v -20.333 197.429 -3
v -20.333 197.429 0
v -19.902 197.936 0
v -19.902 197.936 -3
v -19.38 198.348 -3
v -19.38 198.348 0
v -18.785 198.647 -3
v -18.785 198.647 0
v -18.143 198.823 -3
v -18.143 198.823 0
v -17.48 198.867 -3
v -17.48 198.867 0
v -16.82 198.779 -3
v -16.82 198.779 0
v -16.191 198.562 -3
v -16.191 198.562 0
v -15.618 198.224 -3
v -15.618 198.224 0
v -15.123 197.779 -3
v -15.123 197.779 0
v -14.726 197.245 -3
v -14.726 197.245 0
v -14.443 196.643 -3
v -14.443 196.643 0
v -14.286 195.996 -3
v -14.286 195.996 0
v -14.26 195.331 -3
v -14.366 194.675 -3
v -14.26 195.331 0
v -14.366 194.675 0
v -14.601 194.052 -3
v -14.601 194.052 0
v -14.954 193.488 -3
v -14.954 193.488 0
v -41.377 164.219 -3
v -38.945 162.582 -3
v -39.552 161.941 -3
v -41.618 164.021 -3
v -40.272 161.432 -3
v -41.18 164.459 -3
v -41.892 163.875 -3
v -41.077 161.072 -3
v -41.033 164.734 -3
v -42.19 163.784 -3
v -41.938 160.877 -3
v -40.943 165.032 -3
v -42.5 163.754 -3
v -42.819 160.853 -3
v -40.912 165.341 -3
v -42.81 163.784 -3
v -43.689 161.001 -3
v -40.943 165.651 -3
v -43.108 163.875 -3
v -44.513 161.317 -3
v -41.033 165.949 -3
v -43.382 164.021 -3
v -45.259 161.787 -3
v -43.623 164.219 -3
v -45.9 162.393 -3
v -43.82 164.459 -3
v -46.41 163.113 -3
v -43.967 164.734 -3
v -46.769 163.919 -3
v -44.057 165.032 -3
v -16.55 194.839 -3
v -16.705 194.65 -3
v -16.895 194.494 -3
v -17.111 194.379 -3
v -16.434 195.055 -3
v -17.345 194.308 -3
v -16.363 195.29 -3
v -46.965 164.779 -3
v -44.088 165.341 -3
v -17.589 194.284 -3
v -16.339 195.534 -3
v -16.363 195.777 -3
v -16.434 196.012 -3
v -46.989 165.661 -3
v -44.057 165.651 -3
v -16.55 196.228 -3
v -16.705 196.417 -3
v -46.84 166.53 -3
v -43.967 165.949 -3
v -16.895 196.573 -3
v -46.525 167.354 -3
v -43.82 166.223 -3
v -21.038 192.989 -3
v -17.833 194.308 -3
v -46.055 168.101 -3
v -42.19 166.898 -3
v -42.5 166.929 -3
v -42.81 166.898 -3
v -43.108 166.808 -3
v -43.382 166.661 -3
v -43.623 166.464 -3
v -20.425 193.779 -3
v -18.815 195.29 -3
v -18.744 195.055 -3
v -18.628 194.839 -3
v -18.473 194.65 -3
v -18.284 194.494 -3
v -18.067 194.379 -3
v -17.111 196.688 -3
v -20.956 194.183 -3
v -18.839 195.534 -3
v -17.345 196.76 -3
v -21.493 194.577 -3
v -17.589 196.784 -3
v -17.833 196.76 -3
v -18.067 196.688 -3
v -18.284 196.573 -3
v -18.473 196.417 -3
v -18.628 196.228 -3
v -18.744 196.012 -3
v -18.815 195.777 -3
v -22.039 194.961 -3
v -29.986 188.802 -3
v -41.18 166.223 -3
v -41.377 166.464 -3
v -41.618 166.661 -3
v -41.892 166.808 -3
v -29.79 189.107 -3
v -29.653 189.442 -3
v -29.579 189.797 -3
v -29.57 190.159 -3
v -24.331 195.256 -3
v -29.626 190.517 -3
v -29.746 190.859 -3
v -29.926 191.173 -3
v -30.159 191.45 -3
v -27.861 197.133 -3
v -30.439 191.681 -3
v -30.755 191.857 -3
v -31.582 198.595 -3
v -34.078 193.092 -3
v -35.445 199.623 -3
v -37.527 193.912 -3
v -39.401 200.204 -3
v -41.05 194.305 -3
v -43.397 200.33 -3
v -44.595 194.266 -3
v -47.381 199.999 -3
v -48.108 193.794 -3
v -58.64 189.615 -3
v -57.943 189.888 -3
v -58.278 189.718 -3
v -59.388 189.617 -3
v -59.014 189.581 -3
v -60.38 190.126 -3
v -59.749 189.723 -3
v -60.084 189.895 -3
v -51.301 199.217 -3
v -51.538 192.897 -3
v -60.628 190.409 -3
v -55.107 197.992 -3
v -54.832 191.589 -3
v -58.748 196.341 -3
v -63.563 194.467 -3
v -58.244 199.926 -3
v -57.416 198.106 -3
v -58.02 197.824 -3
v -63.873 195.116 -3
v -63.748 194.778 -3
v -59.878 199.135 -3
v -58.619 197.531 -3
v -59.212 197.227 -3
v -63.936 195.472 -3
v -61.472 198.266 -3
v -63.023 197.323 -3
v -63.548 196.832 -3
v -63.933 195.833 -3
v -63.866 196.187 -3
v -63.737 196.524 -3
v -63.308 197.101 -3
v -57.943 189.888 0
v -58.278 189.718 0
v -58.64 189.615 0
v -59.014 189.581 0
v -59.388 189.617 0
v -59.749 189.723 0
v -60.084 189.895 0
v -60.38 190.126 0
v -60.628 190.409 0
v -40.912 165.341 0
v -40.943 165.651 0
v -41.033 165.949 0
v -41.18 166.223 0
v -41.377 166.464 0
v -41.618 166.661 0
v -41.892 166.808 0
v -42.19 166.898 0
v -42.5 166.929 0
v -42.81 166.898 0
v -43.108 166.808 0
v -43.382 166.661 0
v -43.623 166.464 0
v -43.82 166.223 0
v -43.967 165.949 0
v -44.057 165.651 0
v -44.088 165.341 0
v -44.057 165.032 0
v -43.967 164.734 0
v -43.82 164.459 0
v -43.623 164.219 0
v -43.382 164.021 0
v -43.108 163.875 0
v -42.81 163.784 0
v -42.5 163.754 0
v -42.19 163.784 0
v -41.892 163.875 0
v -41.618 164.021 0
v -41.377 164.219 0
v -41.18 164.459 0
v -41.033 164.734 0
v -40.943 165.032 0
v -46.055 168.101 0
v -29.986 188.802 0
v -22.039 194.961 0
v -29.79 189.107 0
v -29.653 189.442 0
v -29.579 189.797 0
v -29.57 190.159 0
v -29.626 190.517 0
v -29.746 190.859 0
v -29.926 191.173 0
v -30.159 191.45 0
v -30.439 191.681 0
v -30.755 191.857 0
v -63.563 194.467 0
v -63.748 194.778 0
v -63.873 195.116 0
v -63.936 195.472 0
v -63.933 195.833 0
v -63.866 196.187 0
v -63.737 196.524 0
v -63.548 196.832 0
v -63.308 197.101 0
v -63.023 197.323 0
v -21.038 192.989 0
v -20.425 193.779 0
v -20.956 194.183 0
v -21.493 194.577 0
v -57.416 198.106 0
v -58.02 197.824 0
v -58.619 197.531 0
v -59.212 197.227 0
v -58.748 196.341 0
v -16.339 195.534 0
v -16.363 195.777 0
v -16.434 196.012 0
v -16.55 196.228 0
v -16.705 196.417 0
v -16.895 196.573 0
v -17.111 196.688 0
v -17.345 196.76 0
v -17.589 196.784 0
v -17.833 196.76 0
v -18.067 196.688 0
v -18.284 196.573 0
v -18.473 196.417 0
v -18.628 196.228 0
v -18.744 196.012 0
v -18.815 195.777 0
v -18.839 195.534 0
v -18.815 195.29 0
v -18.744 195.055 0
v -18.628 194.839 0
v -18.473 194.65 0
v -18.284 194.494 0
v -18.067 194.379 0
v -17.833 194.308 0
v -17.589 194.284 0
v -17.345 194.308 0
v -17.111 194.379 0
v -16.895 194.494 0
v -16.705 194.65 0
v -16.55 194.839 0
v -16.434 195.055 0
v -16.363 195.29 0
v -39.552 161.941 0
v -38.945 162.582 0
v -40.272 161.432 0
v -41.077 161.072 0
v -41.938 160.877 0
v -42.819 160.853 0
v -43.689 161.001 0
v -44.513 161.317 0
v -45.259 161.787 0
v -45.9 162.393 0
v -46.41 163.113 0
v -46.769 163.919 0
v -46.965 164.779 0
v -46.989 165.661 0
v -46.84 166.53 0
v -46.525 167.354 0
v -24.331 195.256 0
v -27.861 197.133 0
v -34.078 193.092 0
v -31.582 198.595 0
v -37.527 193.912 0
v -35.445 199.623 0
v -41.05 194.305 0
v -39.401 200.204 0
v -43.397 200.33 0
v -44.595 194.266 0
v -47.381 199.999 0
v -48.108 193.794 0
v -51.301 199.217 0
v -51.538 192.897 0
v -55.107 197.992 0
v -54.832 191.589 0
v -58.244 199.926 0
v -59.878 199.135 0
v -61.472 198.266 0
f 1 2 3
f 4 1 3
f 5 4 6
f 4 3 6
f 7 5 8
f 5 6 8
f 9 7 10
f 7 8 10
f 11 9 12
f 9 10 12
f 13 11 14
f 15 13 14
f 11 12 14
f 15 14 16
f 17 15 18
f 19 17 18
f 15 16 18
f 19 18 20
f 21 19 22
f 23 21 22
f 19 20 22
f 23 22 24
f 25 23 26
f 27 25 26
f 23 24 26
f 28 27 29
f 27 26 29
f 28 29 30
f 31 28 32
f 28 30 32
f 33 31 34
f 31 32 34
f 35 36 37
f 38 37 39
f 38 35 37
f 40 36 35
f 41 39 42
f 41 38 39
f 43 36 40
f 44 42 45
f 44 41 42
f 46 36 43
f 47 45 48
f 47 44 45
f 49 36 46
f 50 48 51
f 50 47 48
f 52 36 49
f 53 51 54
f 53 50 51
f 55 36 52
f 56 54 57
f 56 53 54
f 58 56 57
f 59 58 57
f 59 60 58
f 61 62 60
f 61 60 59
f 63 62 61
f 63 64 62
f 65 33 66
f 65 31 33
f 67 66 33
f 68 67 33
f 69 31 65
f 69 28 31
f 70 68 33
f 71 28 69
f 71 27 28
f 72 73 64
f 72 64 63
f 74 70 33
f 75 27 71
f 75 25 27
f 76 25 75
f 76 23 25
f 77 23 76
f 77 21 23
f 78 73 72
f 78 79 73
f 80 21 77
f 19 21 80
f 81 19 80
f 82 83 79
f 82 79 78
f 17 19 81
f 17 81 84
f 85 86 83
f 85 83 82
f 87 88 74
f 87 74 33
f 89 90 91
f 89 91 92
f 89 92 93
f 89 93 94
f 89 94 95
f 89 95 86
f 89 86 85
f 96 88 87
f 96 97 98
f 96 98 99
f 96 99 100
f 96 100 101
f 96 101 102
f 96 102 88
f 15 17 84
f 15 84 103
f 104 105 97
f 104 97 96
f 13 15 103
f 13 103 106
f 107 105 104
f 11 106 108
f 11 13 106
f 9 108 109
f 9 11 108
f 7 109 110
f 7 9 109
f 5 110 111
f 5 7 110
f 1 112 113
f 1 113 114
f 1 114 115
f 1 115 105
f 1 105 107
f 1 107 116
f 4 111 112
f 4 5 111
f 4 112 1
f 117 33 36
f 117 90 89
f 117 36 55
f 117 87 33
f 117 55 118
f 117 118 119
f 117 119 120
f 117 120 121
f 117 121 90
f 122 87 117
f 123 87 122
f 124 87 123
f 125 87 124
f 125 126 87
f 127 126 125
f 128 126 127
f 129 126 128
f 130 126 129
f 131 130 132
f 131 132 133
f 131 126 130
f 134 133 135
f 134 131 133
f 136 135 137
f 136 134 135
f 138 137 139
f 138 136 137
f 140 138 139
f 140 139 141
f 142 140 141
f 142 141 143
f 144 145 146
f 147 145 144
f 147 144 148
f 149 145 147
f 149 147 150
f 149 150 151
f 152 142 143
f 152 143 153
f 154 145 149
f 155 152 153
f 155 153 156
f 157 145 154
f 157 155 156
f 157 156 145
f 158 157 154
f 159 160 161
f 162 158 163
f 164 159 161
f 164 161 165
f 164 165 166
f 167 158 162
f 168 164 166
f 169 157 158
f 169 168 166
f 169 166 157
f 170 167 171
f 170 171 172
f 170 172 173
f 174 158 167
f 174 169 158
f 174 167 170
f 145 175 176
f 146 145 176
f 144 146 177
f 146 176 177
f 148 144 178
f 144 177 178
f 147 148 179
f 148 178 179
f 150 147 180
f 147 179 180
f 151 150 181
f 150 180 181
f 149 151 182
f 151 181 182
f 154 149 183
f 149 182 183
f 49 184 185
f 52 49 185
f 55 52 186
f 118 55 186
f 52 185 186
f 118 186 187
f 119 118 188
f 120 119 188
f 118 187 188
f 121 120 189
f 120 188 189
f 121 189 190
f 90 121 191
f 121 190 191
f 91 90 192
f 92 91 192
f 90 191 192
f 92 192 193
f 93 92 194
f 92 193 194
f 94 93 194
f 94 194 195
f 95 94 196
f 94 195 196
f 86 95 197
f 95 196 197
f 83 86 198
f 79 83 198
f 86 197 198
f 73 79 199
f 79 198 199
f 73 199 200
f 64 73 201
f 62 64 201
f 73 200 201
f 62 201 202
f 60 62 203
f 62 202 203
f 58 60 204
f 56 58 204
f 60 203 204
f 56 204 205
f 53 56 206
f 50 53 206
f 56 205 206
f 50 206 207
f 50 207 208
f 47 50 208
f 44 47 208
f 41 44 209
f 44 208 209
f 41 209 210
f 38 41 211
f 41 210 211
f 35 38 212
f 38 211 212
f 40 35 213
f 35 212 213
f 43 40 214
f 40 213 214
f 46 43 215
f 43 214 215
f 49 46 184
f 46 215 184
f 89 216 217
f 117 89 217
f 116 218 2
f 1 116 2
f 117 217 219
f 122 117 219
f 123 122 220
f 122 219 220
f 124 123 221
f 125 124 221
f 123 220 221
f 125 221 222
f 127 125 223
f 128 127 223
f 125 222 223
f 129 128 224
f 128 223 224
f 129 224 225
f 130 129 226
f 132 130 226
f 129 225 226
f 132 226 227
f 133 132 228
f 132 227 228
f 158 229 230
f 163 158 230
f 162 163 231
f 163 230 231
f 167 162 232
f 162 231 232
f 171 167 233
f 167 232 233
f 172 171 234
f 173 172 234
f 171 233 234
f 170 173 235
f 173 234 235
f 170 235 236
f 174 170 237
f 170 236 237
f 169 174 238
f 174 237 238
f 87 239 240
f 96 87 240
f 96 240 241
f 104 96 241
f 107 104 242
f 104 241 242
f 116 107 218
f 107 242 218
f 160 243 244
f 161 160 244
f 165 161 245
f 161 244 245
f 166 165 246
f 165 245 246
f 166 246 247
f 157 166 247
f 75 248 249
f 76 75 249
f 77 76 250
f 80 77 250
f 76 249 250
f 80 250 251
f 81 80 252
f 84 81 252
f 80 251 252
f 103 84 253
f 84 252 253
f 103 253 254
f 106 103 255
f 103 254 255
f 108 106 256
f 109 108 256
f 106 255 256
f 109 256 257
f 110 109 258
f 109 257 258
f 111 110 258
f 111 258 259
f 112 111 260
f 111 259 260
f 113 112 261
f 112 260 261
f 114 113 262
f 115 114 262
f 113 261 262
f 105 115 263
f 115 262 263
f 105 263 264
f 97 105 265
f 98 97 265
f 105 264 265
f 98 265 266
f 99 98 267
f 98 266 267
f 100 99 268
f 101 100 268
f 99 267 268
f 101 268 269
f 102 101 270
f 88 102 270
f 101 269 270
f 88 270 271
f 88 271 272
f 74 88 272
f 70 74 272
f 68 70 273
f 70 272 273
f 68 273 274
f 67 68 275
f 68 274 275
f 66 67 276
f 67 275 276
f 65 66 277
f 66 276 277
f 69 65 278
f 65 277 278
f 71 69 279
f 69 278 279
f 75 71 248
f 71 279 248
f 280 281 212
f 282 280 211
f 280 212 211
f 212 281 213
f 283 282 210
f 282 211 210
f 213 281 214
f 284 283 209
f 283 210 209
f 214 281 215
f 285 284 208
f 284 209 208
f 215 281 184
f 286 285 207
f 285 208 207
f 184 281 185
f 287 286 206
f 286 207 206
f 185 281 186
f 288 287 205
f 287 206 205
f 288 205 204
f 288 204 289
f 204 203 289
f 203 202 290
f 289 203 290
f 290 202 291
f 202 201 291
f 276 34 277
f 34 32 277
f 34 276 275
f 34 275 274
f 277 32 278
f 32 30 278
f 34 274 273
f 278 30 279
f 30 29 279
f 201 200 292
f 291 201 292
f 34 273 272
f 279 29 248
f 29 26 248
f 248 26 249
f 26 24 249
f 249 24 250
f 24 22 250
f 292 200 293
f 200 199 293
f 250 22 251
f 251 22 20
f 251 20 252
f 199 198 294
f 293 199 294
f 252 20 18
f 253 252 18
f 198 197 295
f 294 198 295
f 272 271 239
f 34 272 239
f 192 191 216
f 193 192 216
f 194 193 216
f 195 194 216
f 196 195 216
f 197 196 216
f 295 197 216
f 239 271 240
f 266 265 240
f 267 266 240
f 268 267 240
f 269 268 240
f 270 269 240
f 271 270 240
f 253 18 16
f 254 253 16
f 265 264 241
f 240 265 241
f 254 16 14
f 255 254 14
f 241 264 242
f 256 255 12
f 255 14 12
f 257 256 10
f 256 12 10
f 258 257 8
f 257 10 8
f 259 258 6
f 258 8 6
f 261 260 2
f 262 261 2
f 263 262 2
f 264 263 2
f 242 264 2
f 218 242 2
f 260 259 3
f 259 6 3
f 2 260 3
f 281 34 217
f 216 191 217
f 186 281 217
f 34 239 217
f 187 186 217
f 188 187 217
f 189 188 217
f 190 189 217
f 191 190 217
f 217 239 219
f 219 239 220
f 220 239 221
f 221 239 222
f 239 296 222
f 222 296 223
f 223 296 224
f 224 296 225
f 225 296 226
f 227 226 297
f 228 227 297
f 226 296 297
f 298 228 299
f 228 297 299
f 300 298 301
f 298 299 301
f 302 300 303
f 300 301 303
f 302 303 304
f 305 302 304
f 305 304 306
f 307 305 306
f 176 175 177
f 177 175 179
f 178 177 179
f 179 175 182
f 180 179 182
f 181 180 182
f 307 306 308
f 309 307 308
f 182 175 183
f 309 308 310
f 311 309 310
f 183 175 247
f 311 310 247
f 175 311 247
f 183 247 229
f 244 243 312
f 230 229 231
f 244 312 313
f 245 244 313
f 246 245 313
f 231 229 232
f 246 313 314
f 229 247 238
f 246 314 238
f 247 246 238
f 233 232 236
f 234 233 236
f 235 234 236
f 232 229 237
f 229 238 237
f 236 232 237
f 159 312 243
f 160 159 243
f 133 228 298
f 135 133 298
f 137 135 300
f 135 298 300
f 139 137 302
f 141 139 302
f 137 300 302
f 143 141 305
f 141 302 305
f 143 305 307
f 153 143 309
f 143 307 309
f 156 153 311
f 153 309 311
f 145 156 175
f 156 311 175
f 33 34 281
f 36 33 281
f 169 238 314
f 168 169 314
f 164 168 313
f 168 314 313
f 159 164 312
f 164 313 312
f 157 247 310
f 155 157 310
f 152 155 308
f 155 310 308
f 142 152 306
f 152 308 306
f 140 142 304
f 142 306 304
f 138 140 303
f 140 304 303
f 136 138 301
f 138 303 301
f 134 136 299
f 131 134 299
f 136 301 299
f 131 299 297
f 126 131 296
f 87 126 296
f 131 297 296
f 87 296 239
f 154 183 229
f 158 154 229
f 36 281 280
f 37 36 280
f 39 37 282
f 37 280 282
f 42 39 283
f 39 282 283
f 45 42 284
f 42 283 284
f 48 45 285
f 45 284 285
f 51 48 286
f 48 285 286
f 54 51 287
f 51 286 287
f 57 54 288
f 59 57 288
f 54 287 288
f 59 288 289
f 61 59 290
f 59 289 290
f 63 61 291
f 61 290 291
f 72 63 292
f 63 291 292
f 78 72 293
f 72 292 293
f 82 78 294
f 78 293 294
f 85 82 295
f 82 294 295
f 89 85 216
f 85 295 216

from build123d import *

# Parameters (mm, degrees)
SKETCH1_R           = 1.5875
SKETCH1_R_2         = 1.25
BOSS_EXTRUDE1_DEPTH = 3


with BuildPart() as part:
    # Sketch1 → Boss-Extrude1 (new body)
    with BuildSketch(Plane.XY):
        with BuildLine():
            Line((-14.954240874, 193.488256671), (-38.94528665, 162.581960817))
            ThreePointArc((-38.94528665, 162.581960817), (-45.259350105, 161.786597572), (-46.05471335, 168.100661026))
            Line((-46.05471335, 168.100661026), (-29.985536617, 188.801664845))
            ThreePointArc((-29.985536617, 188.801664845), (-29.626045817, 190.516785549), (-30.755439529, 191.856689466))
            ThreePointArc((-30.755439529, 191.856689466), (-44.594733066, 194.265558421), (-57.942527266, 189.887763856))
            ThreePointArc((-57.942527266, 189.887763856), (-59.388320452, 189.617207801), (-60.628151377, 190.408622856))
            Line((-60.628151377, 190.408622856), (-63.563416093, 194.467459011))
            ThreePointArc((-63.563416093, 194.467459011), (-63.907898099, 196.011433745), (-63.022949076, 197.322689273))
            ThreePointArc((-63.022949076, 197.322689273), (-60.680350979, 198.710081326), (-58.244425957, 199.926178296))
            Line((-58.244425957, 199.926178296), (-57.415771959, 198.105922118))
            ThreePointArc((-57.415771959, 198.105922118), (-58.320144396, 197.678952012), (-59.212307575, 197.227025207))
            Line((-59.212307575, 197.227025207), (-58.748076809, 196.341310922))
            ThreePointArc((-58.748076809, 196.341310922), (-39.400871452, 200.203832377), (-21.038388075, 192.989081421))
            Line((-21.038388075, 192.989081421), (-20.425199163, 193.779017721))
            ThreePointArc((-20.425199163, 193.779017721), (-21.223653619, 194.381233178), (-22.038528177, 194.961036964))
            Line((-22.038528177, 194.961036964), (-20.333405525, 197.429347468))
            ThreePointArc((-20.333405525, 197.429347468), (-15.617758617, 198.224162104), (-14.954240874, 193.488256671))
        make_face()
        with Locations((-42.5, 165.341310922)):
            Circle(SKETCH1_R, mode=Mode.SUBTRACT)
        with Locations((-17.589064697, 195.53354153)):
            Circle(SKETCH1_R_2, mode=Mode.SUBTRACT)
    extrude(amount=-BOSS_EXTRUDE1_DEPTH)


solid = part.part
